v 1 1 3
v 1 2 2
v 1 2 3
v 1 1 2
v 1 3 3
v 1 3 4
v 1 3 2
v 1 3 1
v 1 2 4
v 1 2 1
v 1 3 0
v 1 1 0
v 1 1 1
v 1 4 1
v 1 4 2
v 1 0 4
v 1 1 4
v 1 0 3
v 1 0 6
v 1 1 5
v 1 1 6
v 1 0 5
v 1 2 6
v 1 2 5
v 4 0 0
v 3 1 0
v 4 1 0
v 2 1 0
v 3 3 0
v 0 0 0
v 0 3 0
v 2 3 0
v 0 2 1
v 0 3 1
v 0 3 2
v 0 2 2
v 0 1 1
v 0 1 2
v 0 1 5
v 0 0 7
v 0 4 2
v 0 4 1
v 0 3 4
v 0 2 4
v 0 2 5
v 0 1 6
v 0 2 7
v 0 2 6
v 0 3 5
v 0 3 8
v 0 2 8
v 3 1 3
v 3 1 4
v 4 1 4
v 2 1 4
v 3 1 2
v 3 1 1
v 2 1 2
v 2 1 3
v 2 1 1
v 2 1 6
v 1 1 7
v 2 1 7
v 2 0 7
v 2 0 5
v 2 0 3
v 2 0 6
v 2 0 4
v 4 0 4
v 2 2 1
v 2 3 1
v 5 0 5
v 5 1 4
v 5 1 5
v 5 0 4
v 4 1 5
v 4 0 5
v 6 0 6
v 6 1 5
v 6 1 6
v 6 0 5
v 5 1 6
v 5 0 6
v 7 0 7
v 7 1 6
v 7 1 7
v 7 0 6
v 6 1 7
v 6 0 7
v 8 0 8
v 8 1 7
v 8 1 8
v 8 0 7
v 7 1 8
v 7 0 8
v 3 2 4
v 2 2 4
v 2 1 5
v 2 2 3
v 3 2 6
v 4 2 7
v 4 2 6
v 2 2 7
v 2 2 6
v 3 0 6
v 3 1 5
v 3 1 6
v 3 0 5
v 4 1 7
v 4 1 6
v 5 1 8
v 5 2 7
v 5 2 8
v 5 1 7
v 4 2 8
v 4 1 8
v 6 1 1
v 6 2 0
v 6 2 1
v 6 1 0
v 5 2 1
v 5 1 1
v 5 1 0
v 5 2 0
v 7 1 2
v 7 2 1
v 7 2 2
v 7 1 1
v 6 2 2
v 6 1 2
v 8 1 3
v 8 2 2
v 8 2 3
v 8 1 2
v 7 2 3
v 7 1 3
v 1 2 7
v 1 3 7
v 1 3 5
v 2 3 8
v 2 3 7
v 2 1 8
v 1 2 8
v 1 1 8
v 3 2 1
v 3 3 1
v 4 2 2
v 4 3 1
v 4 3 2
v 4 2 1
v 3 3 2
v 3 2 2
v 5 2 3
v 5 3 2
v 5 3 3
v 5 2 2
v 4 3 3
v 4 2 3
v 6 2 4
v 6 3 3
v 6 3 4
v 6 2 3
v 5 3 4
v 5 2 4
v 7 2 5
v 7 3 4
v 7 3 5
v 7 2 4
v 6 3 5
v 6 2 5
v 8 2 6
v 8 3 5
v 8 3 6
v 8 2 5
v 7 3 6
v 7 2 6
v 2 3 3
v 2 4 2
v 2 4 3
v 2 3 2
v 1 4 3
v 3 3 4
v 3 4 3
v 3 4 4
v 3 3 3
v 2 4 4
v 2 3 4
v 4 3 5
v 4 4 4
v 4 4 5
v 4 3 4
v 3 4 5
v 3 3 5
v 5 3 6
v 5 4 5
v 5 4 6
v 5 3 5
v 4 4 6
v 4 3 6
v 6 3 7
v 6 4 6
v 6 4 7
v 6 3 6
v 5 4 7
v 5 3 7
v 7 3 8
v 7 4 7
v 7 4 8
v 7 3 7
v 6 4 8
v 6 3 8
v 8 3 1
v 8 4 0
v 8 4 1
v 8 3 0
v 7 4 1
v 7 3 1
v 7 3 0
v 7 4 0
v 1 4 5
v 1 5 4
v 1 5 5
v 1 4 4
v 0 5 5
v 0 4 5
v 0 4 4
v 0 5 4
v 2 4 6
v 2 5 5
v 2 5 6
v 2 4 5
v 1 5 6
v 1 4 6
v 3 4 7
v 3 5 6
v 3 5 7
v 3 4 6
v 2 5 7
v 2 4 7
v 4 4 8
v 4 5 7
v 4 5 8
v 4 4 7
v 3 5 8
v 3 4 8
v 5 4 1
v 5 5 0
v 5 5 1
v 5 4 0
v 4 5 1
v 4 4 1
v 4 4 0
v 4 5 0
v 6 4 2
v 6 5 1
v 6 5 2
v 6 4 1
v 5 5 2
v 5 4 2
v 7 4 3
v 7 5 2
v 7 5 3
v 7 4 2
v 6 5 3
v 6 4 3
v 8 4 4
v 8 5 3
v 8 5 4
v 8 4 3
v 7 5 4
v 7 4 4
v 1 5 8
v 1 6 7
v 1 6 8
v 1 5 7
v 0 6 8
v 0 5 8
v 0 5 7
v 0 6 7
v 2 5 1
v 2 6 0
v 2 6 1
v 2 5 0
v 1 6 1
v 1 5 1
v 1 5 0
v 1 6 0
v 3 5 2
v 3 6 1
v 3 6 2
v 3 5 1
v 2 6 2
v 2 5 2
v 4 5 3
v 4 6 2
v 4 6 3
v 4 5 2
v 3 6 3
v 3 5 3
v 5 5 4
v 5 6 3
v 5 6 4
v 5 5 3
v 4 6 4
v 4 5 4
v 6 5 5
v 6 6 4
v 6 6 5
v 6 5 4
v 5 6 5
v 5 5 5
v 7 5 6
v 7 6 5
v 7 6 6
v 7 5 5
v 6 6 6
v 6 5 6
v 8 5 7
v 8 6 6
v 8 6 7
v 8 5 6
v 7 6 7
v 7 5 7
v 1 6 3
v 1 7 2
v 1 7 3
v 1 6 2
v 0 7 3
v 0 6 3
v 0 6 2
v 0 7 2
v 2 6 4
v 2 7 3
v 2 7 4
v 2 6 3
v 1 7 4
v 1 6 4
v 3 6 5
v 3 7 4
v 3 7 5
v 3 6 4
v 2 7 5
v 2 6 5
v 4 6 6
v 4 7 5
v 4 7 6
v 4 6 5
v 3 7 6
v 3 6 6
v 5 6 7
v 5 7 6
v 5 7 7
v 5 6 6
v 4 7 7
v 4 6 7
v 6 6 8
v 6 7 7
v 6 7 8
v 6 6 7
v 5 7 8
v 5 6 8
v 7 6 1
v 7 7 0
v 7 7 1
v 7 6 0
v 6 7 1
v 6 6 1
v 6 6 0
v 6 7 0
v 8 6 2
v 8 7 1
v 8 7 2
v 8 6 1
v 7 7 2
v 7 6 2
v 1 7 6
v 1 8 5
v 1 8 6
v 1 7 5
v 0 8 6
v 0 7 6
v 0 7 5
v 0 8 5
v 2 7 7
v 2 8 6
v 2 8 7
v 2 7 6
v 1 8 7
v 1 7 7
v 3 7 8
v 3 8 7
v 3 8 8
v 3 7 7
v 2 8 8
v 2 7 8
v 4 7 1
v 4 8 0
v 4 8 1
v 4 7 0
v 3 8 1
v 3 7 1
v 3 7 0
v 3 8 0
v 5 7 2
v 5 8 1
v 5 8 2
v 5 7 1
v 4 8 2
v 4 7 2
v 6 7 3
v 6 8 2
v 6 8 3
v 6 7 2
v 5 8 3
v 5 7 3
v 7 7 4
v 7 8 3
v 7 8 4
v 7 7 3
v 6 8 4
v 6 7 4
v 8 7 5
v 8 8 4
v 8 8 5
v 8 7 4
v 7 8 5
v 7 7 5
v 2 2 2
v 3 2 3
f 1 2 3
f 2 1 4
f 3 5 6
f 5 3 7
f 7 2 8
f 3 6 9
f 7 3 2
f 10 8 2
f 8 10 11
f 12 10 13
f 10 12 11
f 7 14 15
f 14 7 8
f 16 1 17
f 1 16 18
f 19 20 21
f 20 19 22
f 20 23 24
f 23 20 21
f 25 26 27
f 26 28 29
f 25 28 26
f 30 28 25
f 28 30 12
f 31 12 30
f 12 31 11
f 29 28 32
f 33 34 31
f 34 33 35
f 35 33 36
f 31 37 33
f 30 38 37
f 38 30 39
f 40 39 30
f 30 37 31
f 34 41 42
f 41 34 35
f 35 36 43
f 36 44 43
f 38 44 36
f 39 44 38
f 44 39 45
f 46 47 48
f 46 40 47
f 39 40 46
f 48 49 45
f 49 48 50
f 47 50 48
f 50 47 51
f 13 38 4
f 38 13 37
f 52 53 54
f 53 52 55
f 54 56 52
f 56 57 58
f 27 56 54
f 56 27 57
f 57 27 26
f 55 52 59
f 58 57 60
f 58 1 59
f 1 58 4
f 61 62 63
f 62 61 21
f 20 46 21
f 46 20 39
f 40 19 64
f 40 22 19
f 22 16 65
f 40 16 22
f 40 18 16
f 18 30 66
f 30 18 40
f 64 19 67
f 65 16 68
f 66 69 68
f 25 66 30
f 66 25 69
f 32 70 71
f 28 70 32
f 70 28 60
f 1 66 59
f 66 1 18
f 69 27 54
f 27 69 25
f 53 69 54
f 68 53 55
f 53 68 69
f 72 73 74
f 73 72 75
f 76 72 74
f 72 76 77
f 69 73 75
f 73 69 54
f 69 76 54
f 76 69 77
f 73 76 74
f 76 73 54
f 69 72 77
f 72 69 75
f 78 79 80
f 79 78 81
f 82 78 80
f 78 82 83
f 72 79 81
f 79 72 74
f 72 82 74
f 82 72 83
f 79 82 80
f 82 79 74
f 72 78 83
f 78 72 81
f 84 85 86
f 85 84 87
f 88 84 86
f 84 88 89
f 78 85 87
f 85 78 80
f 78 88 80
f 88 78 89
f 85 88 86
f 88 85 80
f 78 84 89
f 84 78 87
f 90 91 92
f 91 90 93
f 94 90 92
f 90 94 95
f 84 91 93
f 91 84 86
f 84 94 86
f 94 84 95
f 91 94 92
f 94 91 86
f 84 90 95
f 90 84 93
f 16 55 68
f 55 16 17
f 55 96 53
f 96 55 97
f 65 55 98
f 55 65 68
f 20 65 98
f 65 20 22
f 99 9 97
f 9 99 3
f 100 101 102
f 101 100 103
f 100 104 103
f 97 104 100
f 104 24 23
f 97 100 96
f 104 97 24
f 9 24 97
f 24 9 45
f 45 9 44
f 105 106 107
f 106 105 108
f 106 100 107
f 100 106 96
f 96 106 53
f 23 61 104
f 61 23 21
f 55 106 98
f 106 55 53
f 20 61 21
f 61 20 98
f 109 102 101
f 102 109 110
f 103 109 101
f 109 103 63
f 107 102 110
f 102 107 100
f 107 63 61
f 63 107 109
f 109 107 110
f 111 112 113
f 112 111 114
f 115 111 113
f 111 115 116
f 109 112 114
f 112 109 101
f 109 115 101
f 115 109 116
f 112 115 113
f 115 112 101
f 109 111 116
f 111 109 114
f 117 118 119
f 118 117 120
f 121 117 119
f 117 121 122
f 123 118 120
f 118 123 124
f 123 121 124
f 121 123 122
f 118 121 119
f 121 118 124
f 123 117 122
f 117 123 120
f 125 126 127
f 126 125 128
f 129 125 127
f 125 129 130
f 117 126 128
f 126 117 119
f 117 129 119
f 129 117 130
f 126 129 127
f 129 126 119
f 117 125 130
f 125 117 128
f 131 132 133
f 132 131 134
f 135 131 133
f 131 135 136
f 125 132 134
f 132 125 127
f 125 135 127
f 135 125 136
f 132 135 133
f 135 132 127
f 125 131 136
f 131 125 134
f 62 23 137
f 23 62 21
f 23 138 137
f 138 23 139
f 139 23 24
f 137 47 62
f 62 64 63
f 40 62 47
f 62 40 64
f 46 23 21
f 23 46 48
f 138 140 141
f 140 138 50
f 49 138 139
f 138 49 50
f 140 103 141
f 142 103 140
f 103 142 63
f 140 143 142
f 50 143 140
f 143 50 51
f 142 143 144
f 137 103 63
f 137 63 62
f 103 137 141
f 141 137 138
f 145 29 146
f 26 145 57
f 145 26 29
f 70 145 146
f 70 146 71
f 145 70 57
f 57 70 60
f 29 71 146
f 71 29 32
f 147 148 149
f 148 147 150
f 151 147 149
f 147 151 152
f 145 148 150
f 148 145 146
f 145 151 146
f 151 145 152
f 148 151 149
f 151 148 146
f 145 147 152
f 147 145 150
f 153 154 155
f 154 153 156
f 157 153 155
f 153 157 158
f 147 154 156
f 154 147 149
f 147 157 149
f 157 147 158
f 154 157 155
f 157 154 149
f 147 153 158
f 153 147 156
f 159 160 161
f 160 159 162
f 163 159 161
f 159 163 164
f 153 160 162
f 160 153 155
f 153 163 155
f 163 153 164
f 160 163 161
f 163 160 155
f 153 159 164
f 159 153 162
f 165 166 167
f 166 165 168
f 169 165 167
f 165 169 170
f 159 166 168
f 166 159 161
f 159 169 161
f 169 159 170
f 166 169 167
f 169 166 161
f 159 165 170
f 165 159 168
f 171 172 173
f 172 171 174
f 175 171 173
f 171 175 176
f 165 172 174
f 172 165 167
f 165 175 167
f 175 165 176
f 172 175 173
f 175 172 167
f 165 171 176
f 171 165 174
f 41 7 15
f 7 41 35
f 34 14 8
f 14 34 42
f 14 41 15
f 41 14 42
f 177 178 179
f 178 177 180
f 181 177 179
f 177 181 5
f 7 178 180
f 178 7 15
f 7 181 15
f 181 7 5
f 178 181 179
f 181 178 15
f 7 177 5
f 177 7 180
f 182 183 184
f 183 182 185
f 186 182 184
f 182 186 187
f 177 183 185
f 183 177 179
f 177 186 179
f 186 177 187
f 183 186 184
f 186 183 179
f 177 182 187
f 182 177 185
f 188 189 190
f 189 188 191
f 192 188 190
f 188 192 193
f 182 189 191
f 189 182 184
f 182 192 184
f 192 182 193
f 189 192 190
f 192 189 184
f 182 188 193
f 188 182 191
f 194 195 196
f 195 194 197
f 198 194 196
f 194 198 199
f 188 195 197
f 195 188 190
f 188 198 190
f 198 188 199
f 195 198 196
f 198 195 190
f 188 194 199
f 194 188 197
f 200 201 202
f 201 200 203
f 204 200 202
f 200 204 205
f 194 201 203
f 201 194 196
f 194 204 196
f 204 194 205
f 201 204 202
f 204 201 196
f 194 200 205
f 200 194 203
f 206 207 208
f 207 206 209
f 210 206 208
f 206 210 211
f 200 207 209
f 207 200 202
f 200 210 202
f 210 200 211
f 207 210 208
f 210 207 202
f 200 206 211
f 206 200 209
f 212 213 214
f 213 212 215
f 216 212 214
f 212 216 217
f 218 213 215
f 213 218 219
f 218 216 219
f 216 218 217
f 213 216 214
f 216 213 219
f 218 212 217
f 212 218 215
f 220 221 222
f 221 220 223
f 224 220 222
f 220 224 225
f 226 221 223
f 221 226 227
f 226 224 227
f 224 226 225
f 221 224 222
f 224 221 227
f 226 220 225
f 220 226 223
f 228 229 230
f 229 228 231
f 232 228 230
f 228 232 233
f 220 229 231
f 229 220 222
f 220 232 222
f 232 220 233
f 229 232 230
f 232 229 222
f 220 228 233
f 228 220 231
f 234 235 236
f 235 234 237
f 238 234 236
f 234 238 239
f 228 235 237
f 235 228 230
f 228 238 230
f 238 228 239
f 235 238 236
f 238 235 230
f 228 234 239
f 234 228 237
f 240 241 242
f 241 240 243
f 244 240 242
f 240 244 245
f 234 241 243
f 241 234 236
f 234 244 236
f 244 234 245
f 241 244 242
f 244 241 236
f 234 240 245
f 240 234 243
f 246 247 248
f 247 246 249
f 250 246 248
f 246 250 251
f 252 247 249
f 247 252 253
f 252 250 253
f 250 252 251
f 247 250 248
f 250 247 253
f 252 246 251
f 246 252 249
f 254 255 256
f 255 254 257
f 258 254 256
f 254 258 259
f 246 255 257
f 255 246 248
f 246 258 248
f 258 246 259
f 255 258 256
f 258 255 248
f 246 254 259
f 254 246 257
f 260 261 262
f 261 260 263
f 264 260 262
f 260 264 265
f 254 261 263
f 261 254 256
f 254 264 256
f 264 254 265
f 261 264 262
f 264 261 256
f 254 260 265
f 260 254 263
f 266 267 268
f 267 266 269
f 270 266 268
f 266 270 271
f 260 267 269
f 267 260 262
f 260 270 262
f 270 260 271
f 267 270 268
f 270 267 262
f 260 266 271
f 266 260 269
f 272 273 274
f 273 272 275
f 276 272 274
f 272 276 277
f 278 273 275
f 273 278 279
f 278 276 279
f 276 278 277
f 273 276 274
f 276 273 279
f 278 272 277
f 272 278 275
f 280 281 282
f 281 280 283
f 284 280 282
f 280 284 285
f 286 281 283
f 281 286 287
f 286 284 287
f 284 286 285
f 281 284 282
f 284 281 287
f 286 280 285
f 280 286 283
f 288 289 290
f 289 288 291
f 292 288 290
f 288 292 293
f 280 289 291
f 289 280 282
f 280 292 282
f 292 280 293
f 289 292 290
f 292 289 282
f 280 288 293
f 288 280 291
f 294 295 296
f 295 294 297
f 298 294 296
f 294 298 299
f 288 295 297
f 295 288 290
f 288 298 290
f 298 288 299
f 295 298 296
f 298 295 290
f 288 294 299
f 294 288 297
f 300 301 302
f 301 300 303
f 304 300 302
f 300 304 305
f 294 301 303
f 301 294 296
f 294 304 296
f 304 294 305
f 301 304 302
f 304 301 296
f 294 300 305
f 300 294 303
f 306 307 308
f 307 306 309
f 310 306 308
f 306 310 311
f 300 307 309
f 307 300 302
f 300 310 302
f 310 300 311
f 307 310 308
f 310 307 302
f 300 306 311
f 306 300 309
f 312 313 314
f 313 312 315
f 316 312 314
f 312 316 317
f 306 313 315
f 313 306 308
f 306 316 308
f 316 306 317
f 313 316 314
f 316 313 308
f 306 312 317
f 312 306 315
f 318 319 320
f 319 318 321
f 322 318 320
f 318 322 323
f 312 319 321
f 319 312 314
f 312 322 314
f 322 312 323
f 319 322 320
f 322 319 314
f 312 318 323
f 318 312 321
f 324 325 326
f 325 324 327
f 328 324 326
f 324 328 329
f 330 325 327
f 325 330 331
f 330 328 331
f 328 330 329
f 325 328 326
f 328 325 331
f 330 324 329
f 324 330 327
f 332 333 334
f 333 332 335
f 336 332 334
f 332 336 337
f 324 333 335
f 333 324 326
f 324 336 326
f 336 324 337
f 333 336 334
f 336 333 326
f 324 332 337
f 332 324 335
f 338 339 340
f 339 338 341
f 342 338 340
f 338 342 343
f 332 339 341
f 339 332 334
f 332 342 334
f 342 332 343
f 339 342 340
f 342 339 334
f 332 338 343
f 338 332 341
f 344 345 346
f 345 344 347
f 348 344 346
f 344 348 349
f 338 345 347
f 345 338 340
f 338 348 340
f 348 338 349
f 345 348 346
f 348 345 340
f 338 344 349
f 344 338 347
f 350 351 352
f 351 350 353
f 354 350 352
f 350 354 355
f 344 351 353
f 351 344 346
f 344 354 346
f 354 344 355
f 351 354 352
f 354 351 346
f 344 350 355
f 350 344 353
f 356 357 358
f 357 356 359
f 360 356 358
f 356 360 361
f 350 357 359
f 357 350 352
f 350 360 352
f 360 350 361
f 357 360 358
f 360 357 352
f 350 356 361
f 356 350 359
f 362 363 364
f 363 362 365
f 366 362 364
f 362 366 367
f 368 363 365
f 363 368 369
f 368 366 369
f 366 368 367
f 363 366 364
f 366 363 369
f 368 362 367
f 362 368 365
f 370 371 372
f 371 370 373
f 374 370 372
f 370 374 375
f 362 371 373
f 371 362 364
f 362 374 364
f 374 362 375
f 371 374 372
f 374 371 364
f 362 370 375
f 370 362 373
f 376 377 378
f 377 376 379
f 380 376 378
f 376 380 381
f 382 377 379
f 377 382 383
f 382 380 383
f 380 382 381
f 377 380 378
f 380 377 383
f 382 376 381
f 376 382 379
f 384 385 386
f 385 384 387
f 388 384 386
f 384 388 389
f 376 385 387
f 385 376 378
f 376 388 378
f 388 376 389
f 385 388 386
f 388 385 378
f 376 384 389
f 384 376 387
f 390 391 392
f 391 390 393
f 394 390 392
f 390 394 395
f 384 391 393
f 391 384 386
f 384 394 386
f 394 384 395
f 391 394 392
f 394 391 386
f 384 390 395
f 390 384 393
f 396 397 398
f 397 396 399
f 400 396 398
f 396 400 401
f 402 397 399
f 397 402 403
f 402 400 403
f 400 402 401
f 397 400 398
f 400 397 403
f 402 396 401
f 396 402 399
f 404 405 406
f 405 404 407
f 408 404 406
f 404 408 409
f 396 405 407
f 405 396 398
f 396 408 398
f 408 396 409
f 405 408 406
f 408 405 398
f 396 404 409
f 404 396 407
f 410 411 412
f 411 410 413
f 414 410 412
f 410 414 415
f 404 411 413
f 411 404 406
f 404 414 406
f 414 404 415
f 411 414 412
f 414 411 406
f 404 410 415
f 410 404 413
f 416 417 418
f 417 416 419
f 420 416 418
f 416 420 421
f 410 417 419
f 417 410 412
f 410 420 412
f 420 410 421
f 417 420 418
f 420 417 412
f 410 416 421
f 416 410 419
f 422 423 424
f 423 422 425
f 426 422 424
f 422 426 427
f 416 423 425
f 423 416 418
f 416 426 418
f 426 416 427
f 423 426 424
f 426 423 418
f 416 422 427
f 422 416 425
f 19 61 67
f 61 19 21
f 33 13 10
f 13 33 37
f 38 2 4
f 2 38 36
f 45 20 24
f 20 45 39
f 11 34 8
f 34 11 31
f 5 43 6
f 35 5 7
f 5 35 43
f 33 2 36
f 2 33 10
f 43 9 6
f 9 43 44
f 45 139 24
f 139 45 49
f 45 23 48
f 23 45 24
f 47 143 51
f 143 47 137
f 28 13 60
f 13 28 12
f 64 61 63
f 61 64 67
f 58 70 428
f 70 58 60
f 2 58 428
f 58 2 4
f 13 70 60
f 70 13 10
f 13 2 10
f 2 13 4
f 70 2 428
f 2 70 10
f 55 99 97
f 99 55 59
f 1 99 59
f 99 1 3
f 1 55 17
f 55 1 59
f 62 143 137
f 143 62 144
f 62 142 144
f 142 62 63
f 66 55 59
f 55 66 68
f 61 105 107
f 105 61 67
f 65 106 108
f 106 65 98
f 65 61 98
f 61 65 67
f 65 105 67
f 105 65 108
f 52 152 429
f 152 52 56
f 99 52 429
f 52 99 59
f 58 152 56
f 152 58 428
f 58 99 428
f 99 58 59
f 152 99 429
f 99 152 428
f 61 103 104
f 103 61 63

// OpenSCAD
union() {
    translate([0, 0, 0]) cube([1, 1, 1]);
    translate([1, 0, 1]) cube([1, 1, 1]);
    translate([2, 0, 2]) cube([1, 1, 1]);
    translate([3, 0, 3]) cube([1, 1, 1]);
    translate([4, 0, 4]) cube([1, 1, 1]);
    translate([5, 0, 5]) cube([1, 1, 1]);
    translate([6, 0, 6]) cube([1, 1, 1]);
    translate([7, 0, 7]) cube([1, 1, 1]);
    translate([0, 1, 3]) cube([1, 1, 1]);
    translate([1, 1, 4]) cube([1, 1, 1]);
    translate([2, 1, 5]) cube([1, 1, 1]);
    translate([3, 1, 6]) cube([1, 1, 1]);
    translate([4, 1, 7]) cube([1, 1, 1]);
    translate([5, 1, 0]) cube([1, 1, 1]);
    translate([6, 1, 1]) cube([1, 1, 1]);
    translate([7, 1, 2]) cube([1, 1, 1]);
    translate([0, 2, 6]) cube([1, 1, 1]);
    translate([1, 2, 7]) cube([1, 1, 1]);
    translate([2, 2, 0]) cube([1, 1, 1]);
    translate([3, 2, 1]) cube([1, 1, 1]);
    translate([4, 2, 2]) cube([1, 1, 1]);
    translate([5, 2, 3]) cube([1, 1, 1]);
    translate([6, 2, 4]) cube([1, 1, 1]);
    translate([7, 2, 5]) cube([1, 1, 1]);
    translate([0, 3, 1]) cube([1, 1, 1]);
    translate([1, 3, 2]) cube([1, 1, 1]);
    translate([2, 3, 3]) cube([1, 1, 1]);
    translate([3, 3, 4]) cube([1, 1, 1]);
    translate([4, 3, 5]) cube([1, 1, 1]);
    translate([5, 3, 6]) cube([1, 1, 1]);
    translate([6, 3, 7]) cube([1, 1, 1]);
    translate([7, 3, 0]) cube([1, 1, 1]);
    translate([0, 4, 4]) cube([1, 1, 1]);
    translate([1, 4, 5]) cube([1, 1, 1]);
    translate([2, 4, 6]) cube([1, 1, 1]);
    translate([3, 4, 7]) cube([1, 1, 1]);
    translate([4, 4, 0]) cube([1, 1, 1]);
    translate([5, 4, 1]) cube([1, 1, 1]);
    translate([6, 4, 2]) cube([1, 1, 1]);
    translate([7, 4, 3]) cube([1, 1, 1]);
    translate([0, 5, 7]) cube([1, 1, 1]);
    translate([1, 5, 0]) cube([1, 1, 1]);
    translate([2, 5, 1]) cube([1, 1, 1]);
    translate([3, 5, 2]) cube([1, 1, 1]);
    translate([4, 5, 3]) cube([1, 1, 1]);
    translate([5, 5, 4]) cube([1, 1, 1]);
    translate([6, 5, 5]) cube([1, 1, 1]);
    translate([7, 5, 6]) cube([1, 1, 1]);
    translate([0, 6, 2]) cube([1, 1, 1]);
    translate([1, 6, 3]) cube([1, 1, 1]);
    translate([2, 6, 4]) cube([1, 1, 1]);
    translate([3, 6, 5]) cube([1, 1, 1]);
    translate([4, 6, 6]) cube([1, 1, 1]);
    translate([5, 6, 7]) cube([1, 1, 1]);
    translate([6, 6, 0]) cube([1, 1, 1]);
    translate([7, 6, 1]) cube([1, 1, 1]);
    translate([0, 7, 5]) cube([1, 1, 1]);
    translate([1, 7, 6]) cube([1, 1, 1]);
    translate([2, 7, 7]) cube([1, 1, 1]);
    translate([3, 7, 0]) cube([1, 1, 1]);
    translate([4, 7, 1]) cube([1, 1, 1]);
    translate([5, 7, 2]) cube([1, 1, 1]);
    translate([6, 7, 3]) cube([1, 1, 1]);
    translate([7, 7, 4]) cube([1, 1, 1]);
    translate([0, 0, 1]) cube([1, 1, 1]);
    translate([0, 0, 2]) cube([1, 1, 1]);
    translate([0, 0, 3]) cube([1, 1, 1]);
    translate([0, 0, 4]) cube([1, 1, 1]);
    translate([0, 0, 5]) cube([1, 1, 1]);
    translate([0, 0, 6]) cube([1, 1, 1]);
    translate([0, 1, 0]) cube([1, 1, 1]);
    translate([0, 1, 2]) cube([1, 1, 1]);
    translate([0, 1, 4]) cube([1, 1, 1]);
    translate([0, 1, 6]) cube([1, 1, 1]);
    translate([0, 2, 0]) cube([1, 1, 1]);
    translate([0, 2, 2]) cube([1, 1, 1]);
    translate([0, 2, 1]) cube([1, 1, 1]);
    translate([0, 2, 3]) cube([1, 1, 1]);
    translate([0, 2, 5]) cube([1, 1, 1]);
    translate([0, 2, 7]) cube([1, 1, 1]);
    translate([1, 0, 0]) cube([1, 1, 1]);
    translate([1, 0, 2]) cube([1, 1, 1]);
    translate([1, 0, 4]) cube([1, 1, 1]);
    translate([1, 0, 6]) cube([1, 1, 1]);
    translate([1, 1, 1]) cube([1, 1, 1]);
    translate([1, 1, 3]) cube([1, 1, 1]);
    translate([1, 1, 5]) cube([1, 1, 1]);
    translate([1, 1, 7]) cube([1, 1, 1]);
    translate([2, 0, 0]) cube([1, 1, 1]);
    translate([2, 0, 1]) cube([1, 1, 1]);
    translate([2, 0, 3]) cube([1, 1, 1]);
    translate([2, 0, 5]) cube([1, 1, 1]);
    translate([2, 1, 0]) cube([1, 1, 1]);
    translate([2, 1, 2]) cube([1, 1, 1]);
    translate([2, 1, 4]) cube([1, 1, 1]);
    translate([2, 1, 6]) cube([1, 1, 1]);
    translate([3, 0, 0]) cube([1, 1, 1]);
    translate([3, 0, 1]) cube([1, 1, 1]);
    translate([3, 0, 2]) cube([1, 1, 1]);
    translate([3, 0, 3]) cube([1, 1, 1]);
}
